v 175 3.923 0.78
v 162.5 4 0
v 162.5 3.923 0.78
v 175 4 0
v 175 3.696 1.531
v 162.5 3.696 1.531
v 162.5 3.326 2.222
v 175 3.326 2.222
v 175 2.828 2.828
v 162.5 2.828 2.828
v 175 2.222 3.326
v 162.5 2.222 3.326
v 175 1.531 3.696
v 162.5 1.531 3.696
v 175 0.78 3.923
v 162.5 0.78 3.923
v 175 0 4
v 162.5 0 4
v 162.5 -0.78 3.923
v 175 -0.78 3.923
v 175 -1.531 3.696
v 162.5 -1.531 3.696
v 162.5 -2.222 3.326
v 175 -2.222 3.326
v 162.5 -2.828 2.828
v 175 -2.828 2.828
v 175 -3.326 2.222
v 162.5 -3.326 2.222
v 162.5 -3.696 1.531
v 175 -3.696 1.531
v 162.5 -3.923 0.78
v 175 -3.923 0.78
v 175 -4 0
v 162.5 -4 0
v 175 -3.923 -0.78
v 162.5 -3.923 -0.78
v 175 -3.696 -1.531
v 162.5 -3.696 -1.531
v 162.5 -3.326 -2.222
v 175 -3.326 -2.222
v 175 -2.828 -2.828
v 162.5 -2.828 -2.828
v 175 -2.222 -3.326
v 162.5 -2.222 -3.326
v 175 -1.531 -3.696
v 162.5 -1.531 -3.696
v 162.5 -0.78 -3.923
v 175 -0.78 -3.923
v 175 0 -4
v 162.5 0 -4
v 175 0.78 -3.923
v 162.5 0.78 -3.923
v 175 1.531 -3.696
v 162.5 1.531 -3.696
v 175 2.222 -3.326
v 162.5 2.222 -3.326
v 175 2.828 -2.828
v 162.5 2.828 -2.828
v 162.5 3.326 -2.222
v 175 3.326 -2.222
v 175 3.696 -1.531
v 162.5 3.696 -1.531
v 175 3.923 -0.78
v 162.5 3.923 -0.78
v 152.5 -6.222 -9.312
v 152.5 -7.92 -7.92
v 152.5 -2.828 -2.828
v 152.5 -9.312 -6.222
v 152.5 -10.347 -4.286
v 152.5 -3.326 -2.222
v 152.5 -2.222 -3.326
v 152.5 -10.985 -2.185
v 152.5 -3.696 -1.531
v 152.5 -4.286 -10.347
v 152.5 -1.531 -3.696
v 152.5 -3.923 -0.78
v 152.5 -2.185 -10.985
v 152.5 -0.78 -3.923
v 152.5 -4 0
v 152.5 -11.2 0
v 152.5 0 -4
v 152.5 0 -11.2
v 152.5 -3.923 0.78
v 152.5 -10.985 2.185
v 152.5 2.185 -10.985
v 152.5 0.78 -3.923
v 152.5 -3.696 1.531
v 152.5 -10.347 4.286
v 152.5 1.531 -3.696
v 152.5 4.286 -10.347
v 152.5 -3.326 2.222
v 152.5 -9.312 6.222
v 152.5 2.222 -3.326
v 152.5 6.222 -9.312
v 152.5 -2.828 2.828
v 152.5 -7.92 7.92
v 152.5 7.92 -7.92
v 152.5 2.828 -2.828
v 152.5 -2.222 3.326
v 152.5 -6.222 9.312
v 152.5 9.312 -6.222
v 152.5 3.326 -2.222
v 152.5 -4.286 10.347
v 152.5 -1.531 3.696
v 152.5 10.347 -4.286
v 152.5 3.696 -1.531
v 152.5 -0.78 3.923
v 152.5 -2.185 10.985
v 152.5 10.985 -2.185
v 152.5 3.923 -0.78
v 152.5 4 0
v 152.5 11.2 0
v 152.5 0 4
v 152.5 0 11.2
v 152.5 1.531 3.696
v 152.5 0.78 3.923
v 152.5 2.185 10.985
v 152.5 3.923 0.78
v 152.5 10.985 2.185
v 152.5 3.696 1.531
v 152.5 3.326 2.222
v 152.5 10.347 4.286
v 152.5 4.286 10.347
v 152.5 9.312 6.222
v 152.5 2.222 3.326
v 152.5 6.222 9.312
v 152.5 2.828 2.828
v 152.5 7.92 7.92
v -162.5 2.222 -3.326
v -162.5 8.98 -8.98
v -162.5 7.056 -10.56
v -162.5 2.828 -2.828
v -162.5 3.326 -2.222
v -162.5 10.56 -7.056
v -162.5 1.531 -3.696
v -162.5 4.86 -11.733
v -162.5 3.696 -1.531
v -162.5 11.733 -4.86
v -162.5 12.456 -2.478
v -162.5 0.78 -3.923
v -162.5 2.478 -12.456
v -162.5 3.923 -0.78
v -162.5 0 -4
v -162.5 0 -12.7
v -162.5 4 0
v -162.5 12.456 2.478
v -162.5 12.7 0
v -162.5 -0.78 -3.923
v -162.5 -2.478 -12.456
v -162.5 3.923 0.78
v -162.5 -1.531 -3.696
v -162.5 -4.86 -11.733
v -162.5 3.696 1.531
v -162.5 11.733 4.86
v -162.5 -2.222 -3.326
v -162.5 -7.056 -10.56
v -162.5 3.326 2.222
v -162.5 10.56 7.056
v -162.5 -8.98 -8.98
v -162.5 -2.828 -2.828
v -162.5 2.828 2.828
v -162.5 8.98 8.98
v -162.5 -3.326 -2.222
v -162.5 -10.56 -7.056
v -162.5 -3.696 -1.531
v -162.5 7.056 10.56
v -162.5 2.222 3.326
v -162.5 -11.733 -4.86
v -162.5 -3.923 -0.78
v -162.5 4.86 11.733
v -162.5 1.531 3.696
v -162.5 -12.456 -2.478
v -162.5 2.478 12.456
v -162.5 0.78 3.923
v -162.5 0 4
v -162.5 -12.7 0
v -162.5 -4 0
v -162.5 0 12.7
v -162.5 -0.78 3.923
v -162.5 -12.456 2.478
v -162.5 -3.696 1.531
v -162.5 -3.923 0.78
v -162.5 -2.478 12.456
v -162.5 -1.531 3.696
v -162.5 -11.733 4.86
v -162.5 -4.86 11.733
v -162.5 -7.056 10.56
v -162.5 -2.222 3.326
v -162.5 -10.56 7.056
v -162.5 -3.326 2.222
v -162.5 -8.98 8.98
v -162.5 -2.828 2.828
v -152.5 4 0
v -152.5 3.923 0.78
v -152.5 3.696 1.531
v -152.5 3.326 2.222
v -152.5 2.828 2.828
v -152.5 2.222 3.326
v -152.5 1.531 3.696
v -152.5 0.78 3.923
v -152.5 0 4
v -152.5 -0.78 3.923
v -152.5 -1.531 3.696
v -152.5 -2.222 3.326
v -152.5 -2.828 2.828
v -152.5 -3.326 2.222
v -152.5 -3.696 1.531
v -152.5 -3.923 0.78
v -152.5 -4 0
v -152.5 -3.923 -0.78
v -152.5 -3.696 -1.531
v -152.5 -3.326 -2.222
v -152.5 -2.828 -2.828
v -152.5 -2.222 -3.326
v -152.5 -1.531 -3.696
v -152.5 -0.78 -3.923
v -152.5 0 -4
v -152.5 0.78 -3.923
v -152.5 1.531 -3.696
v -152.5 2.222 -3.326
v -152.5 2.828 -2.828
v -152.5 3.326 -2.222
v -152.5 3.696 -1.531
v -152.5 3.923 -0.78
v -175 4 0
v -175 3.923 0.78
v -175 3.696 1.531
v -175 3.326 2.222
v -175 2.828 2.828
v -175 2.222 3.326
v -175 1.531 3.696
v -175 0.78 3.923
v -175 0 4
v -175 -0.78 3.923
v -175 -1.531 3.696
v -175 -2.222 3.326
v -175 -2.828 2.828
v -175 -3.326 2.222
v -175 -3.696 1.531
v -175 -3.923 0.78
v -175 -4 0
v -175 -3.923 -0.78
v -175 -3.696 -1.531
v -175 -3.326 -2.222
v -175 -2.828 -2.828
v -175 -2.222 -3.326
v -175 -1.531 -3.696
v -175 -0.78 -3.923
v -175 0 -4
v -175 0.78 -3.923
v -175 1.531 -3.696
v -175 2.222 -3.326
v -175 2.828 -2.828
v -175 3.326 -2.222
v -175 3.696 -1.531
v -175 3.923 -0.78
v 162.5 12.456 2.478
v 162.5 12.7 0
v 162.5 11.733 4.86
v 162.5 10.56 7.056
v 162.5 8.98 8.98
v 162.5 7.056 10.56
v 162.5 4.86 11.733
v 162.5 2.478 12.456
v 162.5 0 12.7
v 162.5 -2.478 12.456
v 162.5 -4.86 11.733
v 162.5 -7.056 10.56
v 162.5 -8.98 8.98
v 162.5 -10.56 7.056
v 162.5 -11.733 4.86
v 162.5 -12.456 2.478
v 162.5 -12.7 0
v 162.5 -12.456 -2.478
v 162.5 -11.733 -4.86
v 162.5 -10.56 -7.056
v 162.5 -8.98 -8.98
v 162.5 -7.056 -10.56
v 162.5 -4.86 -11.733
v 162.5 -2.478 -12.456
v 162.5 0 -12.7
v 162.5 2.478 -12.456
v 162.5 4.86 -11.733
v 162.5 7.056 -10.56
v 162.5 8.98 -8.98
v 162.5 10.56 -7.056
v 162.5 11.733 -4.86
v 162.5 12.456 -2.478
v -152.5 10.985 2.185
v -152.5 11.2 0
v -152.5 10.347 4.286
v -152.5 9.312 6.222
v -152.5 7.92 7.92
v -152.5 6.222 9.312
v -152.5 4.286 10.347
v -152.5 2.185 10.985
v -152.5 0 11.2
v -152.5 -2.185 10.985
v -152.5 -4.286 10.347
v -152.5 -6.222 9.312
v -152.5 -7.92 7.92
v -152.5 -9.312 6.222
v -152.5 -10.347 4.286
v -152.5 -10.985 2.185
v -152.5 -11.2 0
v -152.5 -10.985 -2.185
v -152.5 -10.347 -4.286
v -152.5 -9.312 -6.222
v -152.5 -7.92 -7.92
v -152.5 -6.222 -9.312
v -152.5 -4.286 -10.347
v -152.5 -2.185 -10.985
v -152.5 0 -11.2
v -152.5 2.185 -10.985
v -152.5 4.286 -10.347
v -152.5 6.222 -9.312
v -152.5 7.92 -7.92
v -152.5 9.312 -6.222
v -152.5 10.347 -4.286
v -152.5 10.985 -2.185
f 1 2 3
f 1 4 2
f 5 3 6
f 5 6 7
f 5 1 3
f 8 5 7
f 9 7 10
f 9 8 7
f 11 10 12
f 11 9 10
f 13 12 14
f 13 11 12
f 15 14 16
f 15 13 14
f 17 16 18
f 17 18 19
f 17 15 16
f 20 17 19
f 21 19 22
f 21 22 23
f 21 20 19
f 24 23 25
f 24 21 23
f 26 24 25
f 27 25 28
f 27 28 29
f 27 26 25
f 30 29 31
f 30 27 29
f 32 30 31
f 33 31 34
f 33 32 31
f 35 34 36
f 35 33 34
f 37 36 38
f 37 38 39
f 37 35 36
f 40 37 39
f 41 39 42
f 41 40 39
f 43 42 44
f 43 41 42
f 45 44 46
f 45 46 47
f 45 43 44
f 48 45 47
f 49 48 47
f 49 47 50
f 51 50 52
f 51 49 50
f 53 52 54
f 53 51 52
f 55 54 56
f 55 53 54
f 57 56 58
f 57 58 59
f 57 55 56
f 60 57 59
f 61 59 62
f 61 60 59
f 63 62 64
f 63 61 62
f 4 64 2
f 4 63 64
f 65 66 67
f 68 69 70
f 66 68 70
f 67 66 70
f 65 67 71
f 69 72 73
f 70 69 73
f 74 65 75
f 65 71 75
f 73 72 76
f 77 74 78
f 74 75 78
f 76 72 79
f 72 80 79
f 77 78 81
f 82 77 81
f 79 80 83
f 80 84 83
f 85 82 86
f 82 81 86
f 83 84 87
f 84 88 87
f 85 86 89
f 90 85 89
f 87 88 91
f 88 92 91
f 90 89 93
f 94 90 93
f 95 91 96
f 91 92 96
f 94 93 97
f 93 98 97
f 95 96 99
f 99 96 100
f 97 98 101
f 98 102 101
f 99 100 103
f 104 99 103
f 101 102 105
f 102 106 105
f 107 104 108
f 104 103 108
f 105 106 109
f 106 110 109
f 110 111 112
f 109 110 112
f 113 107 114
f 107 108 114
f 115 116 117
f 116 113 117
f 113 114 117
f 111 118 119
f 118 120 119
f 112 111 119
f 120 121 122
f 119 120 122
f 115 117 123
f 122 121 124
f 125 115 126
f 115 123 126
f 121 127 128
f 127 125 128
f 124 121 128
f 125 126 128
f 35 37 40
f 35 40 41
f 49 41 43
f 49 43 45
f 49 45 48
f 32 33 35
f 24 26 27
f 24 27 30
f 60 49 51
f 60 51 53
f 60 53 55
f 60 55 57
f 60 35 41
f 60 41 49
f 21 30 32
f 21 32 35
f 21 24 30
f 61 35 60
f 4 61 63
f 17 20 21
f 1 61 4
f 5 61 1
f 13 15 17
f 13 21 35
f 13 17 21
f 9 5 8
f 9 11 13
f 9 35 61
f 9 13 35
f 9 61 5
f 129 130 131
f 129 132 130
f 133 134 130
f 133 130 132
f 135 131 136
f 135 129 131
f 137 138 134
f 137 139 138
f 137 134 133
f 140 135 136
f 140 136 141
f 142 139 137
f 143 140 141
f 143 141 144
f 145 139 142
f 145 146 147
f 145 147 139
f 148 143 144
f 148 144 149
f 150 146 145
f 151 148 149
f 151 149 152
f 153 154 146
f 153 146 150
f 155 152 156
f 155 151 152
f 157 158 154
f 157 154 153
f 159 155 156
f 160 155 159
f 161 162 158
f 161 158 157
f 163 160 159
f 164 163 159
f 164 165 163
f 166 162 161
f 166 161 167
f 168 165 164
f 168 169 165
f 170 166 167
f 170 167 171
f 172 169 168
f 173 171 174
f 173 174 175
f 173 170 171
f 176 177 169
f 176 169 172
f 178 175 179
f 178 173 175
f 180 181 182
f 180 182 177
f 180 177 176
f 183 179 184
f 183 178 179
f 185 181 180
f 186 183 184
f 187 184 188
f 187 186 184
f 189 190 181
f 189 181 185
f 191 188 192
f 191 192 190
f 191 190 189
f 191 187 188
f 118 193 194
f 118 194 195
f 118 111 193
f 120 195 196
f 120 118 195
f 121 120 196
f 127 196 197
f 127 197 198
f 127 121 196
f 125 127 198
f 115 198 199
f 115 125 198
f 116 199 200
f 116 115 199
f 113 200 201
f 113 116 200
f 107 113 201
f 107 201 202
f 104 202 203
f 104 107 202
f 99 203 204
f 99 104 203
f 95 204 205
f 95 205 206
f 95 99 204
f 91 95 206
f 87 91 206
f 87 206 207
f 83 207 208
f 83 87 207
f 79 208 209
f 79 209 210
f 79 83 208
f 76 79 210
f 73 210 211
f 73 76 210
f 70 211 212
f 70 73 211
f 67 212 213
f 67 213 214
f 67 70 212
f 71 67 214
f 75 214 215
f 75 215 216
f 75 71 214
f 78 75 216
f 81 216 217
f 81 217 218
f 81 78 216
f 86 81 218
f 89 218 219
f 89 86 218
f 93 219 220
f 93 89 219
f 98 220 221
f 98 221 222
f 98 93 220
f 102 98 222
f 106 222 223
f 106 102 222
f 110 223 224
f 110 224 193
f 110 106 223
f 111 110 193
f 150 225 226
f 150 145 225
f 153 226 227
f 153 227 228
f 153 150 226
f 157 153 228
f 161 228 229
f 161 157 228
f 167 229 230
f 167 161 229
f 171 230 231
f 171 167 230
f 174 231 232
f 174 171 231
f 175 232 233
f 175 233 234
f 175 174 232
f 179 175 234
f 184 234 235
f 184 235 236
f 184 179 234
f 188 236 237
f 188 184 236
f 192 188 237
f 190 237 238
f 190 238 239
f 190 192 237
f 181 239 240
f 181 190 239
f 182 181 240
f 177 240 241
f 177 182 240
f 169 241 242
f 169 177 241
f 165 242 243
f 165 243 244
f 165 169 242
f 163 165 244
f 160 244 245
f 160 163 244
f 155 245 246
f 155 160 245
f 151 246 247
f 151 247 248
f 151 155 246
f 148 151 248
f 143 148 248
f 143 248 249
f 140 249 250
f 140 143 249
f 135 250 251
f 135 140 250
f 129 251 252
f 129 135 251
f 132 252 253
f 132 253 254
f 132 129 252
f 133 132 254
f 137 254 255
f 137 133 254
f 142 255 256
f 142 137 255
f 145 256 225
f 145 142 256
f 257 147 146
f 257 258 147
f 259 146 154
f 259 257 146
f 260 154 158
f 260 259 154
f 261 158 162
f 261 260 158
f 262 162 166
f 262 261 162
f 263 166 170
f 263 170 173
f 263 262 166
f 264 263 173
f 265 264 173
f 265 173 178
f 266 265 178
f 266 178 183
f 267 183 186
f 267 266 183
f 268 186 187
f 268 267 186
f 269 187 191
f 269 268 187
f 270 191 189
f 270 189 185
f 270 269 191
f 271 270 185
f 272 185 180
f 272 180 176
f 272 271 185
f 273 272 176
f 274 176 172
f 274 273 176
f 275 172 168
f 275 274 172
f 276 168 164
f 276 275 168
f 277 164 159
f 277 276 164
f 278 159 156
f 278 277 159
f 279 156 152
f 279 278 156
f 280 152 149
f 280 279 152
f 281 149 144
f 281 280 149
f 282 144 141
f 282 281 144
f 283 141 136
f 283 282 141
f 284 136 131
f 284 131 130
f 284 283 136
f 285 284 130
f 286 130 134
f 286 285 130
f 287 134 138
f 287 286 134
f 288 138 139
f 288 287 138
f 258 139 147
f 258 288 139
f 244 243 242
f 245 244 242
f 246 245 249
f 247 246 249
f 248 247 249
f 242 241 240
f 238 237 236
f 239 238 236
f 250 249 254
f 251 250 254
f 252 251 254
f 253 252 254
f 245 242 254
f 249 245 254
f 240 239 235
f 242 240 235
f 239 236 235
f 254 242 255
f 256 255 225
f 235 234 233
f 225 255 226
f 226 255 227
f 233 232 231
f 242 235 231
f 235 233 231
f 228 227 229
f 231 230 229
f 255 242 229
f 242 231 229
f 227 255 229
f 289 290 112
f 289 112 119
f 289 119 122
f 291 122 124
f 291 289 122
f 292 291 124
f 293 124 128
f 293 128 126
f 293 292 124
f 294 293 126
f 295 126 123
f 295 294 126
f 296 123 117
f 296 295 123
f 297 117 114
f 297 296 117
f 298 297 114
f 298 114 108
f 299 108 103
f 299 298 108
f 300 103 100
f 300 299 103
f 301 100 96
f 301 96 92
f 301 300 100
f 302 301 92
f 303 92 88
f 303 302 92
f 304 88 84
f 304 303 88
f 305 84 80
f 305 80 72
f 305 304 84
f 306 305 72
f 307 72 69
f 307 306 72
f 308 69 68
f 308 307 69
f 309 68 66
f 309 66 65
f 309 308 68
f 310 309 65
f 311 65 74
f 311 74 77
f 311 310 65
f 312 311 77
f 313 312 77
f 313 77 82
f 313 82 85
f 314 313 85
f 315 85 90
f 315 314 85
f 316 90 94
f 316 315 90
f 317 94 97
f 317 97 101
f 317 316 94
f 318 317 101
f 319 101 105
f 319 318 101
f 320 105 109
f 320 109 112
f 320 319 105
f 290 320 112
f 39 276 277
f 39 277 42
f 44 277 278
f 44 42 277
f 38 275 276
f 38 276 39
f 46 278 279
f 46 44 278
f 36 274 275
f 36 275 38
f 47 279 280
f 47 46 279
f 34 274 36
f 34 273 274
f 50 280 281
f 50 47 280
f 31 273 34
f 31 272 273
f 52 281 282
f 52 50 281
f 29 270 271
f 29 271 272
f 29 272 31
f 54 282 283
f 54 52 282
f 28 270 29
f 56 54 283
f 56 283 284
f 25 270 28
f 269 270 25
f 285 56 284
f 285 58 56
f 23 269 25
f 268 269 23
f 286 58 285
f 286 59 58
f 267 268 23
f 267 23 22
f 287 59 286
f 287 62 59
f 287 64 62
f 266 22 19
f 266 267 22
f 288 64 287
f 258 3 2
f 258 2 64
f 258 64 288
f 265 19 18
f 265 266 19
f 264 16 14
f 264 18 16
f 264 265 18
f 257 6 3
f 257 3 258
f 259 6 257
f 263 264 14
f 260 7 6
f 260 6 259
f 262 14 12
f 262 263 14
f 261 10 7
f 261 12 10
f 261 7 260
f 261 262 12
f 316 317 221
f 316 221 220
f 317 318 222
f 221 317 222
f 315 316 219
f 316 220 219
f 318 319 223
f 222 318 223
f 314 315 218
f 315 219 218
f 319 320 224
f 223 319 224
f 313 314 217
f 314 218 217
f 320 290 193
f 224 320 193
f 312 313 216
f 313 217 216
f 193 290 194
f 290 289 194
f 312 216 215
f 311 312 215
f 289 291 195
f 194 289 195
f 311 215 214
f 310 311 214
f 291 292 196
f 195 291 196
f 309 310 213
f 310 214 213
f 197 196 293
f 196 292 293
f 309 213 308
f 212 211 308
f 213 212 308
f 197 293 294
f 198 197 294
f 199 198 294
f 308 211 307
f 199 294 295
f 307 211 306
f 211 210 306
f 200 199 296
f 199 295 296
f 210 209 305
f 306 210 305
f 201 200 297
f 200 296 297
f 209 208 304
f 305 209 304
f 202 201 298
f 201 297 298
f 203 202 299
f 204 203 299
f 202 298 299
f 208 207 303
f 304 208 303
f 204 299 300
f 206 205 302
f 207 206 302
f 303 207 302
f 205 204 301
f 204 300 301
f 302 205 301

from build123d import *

# Parameters (mm, degrees)
F0_R     = 12.7
F0_R_2   = 11.2
F1_DEPTH = 162.5
F2_R     = 4
F3_DEPTH = 175
F4_R     = 11.2
F5_DEPTH = 10
F6_R     = 11.2
F7_DEPTH = 10


with BuildPart() as f1:
    # F0 (on Right) → F1 (new body, symmetric)
    with BuildSketch(Plane.YZ):
        Circle(F0_R)
        Circle(F0_R_2, mode=Mode.SUBTRACT)
    extrude(amount=F1_DEPTH, both=True)



with BuildPart() as f3:
    # F2 (on Right) → F3 (new body, symmetric)
    with BuildSketch(Plane.YZ):
        Circle(F2_R)
    extrude(amount=F3_DEPTH, both=True)


with BuildPart() as f1_1:
    add(f1.part)

    add(f3.part)  # F5 merges F3
    # F4 (on face) → F5 (join)
    with BuildSketch(Plane.YZ.offset(162.5)):
        Circle(F4_R)
    extrude(amount=-F5_DEPTH)

    # F6 (on face) → F7 (join)
    with BuildSketch(Plane(origin=(-162.5, 0, 0), x_dir=(0, -1, 0), z_dir=(-1, 0, 0))):
        Circle(F6_R)
    extrude(amount=-F7_DEPTH)


solid = f1_1.part
